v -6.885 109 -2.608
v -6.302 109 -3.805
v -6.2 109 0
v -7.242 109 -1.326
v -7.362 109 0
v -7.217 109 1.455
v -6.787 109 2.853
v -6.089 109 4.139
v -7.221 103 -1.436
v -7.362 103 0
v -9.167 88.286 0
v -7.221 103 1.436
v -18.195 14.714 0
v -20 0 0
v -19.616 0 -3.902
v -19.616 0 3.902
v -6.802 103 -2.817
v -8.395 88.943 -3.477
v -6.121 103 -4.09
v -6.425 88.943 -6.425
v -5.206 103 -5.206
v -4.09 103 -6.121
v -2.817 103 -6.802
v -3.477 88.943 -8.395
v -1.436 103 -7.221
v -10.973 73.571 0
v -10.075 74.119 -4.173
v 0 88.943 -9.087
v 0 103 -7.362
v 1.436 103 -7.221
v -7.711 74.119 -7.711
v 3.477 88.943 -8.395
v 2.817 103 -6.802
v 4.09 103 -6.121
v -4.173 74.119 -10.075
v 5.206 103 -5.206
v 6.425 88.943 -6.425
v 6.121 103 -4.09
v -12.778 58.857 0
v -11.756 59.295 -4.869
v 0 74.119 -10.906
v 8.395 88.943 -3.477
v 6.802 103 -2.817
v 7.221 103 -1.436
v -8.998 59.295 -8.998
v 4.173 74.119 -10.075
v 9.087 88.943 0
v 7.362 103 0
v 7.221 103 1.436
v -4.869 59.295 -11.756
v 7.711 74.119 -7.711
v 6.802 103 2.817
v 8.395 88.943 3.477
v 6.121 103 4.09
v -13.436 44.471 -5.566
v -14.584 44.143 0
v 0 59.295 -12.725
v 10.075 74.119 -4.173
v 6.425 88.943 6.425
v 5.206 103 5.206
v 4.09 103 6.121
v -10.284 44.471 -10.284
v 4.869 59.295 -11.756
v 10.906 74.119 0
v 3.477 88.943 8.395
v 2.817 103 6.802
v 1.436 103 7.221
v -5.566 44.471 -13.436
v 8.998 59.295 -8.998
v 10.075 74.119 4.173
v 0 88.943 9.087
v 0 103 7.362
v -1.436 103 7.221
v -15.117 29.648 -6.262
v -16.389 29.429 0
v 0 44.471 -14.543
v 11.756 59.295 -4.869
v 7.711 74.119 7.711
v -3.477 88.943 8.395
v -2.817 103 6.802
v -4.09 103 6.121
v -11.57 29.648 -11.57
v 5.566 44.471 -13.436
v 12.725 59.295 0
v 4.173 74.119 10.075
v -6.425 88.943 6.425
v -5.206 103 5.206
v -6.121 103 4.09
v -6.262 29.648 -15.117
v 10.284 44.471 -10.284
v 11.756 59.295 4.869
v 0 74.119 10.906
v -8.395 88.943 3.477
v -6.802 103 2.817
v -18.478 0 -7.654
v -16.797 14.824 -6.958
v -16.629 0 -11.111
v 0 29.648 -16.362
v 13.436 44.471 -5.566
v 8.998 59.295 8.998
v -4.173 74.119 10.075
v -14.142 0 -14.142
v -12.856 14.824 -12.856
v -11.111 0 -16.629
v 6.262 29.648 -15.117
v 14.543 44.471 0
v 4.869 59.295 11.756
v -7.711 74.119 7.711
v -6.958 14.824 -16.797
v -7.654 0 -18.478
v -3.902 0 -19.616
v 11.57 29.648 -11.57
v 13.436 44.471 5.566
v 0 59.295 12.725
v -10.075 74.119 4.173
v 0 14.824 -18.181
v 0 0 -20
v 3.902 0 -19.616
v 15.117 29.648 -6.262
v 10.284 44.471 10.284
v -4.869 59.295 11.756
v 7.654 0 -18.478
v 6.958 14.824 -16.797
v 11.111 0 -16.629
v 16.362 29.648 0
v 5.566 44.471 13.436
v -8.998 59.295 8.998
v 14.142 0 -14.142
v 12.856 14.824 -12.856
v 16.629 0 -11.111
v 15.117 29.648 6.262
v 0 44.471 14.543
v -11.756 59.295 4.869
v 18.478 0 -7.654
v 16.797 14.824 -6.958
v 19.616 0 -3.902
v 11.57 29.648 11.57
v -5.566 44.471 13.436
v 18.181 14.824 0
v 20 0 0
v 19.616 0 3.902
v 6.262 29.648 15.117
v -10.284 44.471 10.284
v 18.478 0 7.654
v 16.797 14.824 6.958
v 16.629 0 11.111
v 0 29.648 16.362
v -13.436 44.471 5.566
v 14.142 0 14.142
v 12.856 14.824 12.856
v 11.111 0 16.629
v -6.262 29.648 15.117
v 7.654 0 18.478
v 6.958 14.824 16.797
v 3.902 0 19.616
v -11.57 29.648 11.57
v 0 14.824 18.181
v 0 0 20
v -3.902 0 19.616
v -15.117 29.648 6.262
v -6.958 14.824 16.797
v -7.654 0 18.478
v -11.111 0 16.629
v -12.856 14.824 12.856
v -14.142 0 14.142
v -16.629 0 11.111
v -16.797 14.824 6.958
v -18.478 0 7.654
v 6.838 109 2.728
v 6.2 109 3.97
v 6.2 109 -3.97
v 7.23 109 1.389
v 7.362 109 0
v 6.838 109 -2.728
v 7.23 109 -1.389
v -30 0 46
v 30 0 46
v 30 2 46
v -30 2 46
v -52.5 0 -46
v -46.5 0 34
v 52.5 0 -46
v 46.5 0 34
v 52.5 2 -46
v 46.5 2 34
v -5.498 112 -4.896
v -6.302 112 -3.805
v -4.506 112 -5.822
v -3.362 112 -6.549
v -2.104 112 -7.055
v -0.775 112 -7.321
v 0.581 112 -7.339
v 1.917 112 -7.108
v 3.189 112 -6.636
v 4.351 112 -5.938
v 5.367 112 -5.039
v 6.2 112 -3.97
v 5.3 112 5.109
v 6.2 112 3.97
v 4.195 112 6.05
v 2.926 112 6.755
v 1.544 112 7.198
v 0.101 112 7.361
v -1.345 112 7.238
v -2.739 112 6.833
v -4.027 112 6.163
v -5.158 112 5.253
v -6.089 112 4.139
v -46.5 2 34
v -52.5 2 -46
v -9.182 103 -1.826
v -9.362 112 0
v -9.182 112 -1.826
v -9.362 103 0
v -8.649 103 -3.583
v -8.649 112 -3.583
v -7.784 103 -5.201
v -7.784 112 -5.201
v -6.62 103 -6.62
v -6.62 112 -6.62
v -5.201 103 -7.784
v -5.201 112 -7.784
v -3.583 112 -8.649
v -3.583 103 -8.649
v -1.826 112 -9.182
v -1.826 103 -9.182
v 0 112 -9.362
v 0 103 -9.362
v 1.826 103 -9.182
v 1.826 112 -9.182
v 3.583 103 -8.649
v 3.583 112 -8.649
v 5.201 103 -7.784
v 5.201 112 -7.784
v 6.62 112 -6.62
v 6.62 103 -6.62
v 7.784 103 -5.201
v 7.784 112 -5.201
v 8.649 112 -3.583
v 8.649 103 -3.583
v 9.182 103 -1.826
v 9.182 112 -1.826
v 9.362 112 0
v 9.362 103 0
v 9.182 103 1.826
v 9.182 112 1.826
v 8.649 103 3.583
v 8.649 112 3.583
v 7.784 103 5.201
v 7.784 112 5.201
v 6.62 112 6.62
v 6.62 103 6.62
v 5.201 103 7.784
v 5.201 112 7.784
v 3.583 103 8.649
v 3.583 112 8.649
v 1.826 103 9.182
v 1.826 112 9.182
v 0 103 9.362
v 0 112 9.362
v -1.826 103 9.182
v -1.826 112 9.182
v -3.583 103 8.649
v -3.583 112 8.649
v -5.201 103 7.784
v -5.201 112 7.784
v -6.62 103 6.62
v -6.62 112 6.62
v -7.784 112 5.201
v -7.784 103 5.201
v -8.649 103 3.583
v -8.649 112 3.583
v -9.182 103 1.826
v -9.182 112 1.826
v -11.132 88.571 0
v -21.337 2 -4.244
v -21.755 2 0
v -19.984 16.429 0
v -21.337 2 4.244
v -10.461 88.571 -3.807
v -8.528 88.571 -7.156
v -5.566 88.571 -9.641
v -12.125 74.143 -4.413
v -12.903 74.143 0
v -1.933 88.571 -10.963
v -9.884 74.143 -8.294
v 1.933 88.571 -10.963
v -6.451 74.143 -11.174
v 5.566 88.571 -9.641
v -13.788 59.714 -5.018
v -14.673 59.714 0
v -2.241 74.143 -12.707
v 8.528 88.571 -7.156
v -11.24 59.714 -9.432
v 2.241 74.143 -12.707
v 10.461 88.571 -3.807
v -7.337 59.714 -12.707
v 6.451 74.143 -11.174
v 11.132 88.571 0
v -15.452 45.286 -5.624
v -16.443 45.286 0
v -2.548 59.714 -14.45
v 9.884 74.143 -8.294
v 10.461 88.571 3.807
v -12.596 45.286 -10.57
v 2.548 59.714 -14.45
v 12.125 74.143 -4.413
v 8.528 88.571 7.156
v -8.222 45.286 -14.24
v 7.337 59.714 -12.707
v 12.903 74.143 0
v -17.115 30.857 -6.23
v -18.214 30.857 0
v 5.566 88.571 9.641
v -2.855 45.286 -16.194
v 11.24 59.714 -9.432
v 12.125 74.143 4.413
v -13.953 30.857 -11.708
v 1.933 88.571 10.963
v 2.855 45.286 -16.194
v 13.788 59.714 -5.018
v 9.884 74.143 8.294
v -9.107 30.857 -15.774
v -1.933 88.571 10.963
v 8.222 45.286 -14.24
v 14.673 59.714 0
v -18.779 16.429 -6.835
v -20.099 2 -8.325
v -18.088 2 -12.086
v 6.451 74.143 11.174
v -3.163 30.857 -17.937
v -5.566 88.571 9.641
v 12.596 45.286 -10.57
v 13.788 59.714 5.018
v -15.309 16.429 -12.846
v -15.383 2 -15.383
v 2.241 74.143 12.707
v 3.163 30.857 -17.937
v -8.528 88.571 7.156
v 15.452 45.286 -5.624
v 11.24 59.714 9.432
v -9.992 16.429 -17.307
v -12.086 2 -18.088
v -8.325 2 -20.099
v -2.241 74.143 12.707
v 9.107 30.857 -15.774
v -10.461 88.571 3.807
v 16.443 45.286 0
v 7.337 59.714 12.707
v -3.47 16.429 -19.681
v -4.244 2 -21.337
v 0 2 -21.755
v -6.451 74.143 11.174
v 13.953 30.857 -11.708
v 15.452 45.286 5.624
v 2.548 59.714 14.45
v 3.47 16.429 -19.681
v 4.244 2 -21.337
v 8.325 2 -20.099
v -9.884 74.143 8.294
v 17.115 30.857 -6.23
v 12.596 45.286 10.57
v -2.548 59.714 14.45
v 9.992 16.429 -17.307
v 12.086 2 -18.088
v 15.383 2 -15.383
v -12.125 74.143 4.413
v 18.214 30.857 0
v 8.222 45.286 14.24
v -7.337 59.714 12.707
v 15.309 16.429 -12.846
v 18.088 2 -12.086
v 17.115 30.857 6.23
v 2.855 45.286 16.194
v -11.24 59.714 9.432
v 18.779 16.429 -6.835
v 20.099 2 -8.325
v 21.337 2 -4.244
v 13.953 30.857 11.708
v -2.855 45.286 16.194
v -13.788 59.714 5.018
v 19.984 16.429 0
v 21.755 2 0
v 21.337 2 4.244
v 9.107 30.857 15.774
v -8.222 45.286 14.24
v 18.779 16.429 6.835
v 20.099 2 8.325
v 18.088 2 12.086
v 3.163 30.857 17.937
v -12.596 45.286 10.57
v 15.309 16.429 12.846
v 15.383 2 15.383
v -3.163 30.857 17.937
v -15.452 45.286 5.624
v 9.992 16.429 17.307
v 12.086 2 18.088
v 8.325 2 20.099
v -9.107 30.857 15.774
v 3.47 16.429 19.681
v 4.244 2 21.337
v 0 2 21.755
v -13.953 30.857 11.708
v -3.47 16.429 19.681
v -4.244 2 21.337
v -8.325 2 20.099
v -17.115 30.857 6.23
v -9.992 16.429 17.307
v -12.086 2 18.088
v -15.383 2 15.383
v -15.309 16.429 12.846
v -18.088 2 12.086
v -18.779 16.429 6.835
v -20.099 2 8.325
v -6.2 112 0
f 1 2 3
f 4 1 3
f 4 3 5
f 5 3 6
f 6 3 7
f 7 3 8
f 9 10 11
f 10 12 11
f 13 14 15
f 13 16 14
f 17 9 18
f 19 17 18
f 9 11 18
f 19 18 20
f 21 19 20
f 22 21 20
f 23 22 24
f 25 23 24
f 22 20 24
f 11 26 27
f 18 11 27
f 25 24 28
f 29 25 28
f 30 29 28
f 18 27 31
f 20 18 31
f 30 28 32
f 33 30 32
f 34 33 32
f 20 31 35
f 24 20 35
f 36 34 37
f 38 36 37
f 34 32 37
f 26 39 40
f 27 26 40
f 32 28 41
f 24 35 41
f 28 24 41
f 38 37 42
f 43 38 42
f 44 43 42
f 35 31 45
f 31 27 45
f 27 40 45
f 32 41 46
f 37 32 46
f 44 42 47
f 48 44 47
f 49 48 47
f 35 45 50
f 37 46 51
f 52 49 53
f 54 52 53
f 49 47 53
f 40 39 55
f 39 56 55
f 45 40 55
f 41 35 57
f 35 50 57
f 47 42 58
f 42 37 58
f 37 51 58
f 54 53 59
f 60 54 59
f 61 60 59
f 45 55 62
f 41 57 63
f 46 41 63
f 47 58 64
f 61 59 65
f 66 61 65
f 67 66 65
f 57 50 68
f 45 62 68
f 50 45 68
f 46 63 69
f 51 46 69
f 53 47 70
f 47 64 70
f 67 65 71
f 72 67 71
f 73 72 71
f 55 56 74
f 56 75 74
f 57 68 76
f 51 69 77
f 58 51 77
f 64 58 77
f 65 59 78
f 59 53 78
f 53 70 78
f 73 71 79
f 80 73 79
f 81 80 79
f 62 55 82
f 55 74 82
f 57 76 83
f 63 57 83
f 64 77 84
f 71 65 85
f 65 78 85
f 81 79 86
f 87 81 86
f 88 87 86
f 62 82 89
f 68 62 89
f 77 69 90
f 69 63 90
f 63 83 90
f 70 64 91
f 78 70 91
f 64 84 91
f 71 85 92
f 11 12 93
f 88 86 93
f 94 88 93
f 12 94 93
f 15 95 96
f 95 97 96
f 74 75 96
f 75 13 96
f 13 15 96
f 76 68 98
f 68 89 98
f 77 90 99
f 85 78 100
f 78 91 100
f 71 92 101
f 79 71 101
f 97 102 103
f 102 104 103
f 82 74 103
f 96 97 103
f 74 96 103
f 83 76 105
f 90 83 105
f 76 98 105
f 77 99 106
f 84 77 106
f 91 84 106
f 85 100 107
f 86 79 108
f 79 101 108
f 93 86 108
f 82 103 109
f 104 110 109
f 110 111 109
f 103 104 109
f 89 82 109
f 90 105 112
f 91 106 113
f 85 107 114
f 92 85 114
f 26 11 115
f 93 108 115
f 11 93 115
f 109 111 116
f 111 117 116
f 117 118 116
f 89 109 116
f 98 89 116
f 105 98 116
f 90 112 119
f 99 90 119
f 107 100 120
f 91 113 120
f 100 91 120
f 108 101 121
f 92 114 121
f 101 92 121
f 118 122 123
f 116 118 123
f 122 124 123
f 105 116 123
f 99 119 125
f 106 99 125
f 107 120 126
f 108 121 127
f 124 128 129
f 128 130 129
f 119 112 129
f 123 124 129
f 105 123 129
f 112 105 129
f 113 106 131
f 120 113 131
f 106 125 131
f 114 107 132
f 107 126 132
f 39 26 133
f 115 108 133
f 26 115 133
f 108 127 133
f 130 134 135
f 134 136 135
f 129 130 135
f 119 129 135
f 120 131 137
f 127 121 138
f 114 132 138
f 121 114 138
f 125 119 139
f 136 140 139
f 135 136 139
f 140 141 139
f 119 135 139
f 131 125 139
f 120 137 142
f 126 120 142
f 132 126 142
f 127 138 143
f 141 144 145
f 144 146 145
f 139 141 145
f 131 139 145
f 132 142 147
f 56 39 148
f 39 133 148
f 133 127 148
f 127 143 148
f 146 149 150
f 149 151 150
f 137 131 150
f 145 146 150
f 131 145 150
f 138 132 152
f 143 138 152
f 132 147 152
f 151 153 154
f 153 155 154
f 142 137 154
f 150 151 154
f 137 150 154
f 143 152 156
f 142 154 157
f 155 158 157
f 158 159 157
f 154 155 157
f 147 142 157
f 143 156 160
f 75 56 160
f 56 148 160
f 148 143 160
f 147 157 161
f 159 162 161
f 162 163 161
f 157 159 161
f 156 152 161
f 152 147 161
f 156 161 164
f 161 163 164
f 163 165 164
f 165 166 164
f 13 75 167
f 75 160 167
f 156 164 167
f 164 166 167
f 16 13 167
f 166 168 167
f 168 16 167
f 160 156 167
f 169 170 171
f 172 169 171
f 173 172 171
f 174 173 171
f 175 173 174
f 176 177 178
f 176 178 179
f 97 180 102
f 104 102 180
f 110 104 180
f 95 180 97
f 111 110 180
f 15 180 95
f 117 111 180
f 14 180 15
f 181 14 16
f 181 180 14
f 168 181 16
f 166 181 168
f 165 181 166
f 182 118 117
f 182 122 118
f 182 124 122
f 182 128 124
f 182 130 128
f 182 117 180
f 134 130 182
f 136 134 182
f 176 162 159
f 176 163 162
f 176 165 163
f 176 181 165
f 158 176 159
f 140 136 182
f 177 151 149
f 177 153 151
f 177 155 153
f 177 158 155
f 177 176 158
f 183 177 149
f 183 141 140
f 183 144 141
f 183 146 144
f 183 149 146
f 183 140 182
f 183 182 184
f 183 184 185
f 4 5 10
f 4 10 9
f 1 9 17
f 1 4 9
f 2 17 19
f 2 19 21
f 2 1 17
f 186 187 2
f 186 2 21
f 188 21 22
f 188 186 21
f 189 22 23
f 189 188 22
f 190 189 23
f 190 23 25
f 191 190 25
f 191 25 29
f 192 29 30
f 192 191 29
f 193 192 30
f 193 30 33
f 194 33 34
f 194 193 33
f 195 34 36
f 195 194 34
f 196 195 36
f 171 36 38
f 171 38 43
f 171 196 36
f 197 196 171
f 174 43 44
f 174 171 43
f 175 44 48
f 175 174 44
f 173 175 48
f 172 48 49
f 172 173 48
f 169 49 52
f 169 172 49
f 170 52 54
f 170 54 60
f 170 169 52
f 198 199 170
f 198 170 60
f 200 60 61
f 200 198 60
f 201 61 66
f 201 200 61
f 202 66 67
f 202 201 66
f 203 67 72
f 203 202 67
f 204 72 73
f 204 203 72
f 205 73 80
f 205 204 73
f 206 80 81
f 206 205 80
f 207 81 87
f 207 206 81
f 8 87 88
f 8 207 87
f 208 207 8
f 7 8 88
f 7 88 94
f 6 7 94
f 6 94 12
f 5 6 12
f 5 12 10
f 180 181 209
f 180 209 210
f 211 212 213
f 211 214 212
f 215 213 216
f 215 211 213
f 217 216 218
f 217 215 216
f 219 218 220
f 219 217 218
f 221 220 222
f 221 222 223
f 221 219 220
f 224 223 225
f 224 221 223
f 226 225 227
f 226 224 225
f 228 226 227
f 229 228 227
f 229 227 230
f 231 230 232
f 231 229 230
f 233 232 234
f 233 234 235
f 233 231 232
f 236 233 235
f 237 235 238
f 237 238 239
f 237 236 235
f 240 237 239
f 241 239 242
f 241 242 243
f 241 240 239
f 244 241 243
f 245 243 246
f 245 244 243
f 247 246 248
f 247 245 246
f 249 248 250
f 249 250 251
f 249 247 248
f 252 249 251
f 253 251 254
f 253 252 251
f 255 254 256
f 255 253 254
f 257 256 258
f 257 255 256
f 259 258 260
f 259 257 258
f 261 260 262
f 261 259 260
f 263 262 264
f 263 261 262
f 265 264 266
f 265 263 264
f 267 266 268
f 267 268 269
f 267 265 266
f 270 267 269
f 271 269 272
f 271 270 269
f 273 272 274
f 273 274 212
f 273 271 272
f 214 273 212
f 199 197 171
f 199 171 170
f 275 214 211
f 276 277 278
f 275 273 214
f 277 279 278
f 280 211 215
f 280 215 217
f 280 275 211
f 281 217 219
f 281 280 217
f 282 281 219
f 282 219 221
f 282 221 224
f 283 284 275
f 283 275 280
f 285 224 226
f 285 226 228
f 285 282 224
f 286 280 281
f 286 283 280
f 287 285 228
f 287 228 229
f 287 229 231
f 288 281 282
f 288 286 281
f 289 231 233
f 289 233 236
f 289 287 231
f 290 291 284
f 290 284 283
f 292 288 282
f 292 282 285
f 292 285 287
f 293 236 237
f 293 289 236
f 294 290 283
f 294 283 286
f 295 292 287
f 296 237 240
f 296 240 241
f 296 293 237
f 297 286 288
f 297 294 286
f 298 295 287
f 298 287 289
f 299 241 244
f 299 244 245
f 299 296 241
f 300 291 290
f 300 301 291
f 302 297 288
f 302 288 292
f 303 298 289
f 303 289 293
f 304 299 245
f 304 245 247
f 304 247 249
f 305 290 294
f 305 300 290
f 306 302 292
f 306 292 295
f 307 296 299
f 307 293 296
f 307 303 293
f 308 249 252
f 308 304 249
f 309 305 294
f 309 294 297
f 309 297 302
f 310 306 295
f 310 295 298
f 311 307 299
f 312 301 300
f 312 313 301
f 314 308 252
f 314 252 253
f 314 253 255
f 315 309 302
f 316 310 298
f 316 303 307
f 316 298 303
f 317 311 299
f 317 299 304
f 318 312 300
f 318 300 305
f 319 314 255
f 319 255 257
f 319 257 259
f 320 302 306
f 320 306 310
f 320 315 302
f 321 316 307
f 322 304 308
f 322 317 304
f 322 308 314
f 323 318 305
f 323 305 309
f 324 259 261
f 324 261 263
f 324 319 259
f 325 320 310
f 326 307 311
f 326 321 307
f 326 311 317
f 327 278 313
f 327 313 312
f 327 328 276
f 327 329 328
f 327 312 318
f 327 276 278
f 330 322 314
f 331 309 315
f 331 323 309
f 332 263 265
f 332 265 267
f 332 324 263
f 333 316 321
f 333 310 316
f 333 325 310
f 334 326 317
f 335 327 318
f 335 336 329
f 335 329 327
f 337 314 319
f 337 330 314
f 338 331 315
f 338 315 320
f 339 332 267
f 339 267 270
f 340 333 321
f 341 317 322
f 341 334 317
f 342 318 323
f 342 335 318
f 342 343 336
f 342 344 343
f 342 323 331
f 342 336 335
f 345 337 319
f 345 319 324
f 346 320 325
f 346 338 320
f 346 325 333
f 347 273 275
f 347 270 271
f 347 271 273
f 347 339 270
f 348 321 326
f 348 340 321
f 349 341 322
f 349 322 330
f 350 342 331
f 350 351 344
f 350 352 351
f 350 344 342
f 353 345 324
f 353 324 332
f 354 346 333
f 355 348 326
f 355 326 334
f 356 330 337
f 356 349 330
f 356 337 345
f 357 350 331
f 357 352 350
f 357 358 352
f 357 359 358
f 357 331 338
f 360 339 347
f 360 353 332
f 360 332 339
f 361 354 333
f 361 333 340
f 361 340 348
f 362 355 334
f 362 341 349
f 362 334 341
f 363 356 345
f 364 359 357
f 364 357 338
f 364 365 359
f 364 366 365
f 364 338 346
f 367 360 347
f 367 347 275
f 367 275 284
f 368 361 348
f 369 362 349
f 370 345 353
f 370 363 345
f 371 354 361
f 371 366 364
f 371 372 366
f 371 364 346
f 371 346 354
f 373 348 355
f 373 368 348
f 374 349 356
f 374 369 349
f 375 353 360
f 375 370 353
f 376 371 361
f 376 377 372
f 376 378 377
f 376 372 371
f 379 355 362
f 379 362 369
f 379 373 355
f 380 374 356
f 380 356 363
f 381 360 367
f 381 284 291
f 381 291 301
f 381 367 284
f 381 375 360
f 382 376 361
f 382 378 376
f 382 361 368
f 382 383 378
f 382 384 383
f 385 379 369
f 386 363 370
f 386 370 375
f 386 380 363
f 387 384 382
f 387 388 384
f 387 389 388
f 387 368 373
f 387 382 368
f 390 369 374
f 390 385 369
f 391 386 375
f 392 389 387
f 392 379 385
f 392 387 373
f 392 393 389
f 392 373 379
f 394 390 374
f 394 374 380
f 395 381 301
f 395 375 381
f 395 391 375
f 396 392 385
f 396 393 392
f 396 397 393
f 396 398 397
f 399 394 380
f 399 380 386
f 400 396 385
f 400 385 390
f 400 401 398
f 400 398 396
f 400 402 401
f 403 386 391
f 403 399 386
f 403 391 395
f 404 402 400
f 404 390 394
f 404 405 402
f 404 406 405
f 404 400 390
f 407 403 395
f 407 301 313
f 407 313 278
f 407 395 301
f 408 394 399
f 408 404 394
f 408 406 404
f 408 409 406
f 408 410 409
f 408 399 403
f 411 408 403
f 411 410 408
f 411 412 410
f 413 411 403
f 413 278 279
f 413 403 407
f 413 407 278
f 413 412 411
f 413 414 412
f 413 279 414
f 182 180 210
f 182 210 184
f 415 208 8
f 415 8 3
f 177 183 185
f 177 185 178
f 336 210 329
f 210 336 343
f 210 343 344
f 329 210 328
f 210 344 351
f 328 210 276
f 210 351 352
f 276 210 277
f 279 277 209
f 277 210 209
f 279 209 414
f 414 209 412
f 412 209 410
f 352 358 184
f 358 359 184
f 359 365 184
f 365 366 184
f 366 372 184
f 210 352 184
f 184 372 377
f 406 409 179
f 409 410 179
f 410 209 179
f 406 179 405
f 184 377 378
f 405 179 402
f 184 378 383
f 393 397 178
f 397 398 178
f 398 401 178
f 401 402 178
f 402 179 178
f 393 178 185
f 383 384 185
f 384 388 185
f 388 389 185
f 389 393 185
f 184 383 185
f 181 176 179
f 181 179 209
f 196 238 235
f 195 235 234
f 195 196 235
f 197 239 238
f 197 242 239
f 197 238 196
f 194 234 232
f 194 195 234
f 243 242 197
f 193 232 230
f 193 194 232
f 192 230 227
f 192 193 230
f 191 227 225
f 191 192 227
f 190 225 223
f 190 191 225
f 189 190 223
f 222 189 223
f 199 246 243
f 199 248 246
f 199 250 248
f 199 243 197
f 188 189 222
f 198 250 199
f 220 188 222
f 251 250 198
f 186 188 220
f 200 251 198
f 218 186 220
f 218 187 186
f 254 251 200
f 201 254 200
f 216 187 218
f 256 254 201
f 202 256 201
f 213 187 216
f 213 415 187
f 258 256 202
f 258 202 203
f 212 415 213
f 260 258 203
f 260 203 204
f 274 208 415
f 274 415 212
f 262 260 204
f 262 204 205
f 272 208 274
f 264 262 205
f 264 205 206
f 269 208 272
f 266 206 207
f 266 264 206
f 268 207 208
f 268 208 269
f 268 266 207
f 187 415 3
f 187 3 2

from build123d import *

# Parameters (mm, degrees)
F1_DEPTH = 2
F6_DEPTH = 3


with BuildPart() as f1:
    # F0 (on Front) → F1 (new body)
    with BuildSketch(Plane.XZ):
        Polygon((-52.5, -46), (52.5, -46), (46.5, 34), (30, 46), (-30, 46), (-46.5, 34), align=None)
    extrude(amount=-F1_DEPTH)

    # F2 (on Top) → F3 (revolve, cut)
    with BuildSketch(Plane.XY):
        Polygon((-20, 0), (0, 0), (0, 103), (-7.3619631902, 103), align=None)
    revolve(axis=Axis((0, 81.5, 0), (0, -1, 0)), mode=Mode.SUBTRACT)

    # F2 (on Top) → F4 (revolve)
    with BuildSketch(Plane.XY):
        Polygon((-22, 0), (-20, 0), (-7.3619631902, 103), (-9.3619631902, 103), align=None)
        Polygon((-9.3619631902, 103), (-7.3619631902, 103), (-7.3619631902, 112), (-8.2576687117, 112), align=None)
        Polygon((-9.3619631902, 112), (-9.3619631902, 103), (-8.2576687117, 112), align=None)
    revolve(axis=Axis((0, 2, 0), (0, -1, 0)))

    # F5 (on face) → F6 (join)
    with BuildSketch(Plane(origin=(0, 112, 0), x_dir=(-1, 0, 0), z_dir=(0, 1, 0))):
        with BuildLine():
            Line((-6.2, -3.9696979751), (-6.2, 0))
            Line((-6.2, 0), (-6.2, 3.9696979751))
            ThreePointArc((-6.2, 3.9696979751), (-7.3619631902, 0), (-6.2, -3.9696979751))
        make_face()
        with BuildLine():
            Line((6.0885886352, 4.1385493165), (6.2, 0))
            Line((6.2, 0), (6.3024315003, -3.8049782124))
            ThreePointArc((6.3024315003, -3.8049782124), (7.0921354587, -1.9748712995), (7.3619631902, 0))
            ThreePointArc((7.3619631902, 0), (7.0364219397, 2.1650100001), (6.0885886352, 4.1385493165))
        make_face()
    extrude(amount=-F6_DEPTH)


solid = f1.part
